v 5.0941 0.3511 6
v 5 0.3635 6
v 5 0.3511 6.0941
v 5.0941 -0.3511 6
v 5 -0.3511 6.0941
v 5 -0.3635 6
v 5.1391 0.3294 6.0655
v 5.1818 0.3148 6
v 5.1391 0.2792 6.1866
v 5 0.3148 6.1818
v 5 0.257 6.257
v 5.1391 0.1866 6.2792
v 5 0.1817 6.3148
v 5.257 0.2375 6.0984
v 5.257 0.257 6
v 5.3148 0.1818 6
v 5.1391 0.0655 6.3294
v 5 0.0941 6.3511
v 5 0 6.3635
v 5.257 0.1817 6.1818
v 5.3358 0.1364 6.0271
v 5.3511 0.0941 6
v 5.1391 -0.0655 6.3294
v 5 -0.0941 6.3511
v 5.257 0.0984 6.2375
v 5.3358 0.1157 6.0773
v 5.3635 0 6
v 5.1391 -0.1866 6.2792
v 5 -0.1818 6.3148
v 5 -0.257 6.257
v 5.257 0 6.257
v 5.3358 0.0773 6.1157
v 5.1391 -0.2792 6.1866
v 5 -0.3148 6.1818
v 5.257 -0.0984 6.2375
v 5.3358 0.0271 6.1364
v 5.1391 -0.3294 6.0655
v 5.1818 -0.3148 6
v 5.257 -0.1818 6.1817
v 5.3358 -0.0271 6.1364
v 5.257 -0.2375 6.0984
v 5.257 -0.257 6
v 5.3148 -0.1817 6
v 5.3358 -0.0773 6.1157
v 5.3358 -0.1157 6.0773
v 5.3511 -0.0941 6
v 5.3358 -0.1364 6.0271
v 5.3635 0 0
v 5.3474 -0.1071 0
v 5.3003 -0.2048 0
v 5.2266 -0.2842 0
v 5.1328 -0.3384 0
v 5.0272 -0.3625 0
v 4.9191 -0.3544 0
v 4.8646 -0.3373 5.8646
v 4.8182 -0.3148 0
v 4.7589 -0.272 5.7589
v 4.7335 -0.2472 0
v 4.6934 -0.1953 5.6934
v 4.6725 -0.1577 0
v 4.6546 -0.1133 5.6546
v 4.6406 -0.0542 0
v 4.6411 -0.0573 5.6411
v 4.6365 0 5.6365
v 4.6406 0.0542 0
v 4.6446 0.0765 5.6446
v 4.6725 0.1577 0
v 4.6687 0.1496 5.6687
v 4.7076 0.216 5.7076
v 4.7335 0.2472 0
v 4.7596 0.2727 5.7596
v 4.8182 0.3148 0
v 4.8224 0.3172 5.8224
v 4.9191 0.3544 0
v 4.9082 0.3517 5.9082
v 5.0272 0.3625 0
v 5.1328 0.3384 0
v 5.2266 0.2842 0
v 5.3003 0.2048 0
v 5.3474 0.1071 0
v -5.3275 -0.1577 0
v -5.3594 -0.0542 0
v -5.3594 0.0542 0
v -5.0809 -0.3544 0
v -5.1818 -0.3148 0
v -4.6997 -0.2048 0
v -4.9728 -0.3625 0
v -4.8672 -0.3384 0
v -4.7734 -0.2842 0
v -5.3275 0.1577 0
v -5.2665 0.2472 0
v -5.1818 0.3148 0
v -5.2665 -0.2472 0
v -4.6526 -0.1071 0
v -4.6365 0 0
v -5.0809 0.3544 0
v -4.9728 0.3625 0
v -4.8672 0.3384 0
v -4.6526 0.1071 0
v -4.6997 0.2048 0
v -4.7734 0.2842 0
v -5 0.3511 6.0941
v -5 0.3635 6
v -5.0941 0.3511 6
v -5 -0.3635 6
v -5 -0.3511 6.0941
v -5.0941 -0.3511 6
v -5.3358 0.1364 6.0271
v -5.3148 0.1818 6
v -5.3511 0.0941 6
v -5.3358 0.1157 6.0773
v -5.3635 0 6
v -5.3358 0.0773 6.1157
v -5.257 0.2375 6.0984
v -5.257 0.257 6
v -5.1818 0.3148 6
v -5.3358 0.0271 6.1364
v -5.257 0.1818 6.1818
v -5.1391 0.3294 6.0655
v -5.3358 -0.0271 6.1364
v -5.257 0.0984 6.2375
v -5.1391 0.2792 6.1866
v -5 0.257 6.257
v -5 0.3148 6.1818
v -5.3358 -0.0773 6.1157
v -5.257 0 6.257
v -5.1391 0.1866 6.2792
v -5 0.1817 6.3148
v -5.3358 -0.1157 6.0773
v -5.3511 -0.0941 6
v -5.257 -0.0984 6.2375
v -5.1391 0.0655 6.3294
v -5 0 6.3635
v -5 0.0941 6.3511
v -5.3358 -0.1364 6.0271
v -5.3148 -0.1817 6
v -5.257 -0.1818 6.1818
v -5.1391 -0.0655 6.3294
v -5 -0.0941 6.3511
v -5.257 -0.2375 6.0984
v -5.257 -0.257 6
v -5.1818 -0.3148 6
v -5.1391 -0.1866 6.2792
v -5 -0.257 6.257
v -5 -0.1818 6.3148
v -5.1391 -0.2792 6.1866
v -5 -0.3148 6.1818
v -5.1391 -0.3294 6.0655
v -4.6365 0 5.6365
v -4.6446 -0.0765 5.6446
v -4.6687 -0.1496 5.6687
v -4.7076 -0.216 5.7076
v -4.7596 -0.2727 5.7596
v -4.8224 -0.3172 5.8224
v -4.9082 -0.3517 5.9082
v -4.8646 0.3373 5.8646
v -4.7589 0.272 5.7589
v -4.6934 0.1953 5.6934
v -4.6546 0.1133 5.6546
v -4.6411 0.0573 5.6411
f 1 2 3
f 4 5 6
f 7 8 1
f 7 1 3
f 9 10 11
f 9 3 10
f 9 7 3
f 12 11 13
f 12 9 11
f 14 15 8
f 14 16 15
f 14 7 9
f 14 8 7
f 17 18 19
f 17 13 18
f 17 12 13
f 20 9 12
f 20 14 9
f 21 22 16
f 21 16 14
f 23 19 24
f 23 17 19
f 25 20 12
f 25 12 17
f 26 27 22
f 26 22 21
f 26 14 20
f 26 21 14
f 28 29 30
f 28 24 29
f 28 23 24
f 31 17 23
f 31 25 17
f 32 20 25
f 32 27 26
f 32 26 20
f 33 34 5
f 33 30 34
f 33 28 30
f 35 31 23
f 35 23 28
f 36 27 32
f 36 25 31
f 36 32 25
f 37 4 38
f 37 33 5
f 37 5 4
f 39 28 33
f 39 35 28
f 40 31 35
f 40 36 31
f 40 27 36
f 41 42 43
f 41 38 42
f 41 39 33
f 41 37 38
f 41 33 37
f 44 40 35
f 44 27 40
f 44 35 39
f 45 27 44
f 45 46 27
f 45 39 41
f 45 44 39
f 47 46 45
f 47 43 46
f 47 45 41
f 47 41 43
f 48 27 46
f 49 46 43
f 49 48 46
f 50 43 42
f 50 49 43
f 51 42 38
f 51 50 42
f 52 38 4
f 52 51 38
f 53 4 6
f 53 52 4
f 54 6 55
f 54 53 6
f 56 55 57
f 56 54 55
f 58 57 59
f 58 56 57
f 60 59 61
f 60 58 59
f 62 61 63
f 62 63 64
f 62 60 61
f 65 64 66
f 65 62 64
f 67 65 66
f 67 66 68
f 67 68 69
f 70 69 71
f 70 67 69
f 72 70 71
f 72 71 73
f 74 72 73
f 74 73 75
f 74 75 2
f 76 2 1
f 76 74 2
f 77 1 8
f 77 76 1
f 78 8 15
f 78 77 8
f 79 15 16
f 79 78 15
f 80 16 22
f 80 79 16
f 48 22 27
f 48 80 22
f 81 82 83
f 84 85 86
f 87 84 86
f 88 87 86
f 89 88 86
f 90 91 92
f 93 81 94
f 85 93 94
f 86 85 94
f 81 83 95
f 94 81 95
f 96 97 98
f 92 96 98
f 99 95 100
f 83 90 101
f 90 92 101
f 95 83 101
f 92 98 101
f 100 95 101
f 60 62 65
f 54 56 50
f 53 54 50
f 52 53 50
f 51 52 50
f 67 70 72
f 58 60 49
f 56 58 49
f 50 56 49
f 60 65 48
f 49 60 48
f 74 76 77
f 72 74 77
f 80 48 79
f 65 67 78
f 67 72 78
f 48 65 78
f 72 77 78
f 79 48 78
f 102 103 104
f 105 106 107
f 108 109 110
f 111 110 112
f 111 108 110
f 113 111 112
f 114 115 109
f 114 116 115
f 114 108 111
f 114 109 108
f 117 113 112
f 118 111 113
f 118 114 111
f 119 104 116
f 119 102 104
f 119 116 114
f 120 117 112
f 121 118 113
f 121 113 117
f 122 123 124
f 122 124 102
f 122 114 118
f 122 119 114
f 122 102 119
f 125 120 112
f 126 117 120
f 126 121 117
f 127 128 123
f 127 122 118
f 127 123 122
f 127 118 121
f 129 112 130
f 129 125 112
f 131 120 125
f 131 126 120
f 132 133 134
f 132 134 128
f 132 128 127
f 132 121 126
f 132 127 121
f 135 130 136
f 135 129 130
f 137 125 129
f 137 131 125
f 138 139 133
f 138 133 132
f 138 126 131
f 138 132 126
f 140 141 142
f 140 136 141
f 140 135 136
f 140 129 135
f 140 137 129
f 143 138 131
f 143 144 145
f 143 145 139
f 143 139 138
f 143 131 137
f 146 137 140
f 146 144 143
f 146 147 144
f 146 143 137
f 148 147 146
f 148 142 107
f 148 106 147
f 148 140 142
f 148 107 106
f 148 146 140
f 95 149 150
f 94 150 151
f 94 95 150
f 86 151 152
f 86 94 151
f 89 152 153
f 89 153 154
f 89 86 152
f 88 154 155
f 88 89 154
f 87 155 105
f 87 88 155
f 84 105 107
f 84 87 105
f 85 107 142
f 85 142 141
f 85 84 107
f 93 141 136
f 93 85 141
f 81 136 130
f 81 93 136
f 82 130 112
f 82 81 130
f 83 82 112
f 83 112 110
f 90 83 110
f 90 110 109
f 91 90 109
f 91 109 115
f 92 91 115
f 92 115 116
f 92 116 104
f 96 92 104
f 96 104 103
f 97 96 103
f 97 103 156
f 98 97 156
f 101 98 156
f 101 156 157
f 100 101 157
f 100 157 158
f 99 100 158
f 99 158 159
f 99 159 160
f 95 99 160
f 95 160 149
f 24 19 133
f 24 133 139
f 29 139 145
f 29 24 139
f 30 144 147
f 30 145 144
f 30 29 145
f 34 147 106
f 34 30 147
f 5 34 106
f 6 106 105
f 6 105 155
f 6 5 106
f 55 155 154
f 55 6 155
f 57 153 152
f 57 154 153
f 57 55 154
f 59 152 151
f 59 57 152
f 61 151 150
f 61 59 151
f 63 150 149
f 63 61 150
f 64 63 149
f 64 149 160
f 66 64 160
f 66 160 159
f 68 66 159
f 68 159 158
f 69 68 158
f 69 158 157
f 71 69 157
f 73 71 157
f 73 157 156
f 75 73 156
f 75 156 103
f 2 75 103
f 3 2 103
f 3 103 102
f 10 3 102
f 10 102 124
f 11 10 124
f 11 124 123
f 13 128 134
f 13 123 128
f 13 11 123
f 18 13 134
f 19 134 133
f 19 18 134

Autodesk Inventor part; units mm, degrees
sketch "Sketch1" plane through (0, 0, 0) normal (0, 0, 1) x (1, 0, 0)
  circle A0 centre (-5, 0) radius 0.3635
  circle A1 centre (5, 0) radius 0.3635
  line L0 (-7.5089, 0) -> (7.5089, 0) projected
  point P0 (0, 0)
  point P1 (-5.3635, 0)
  point P2 (-4.6365, 0)
  dimension "d2" = 0.727
  dimension "d3" = 0.727
  dimension "d4" = 10
  dimension "d5" = 5
extrude "Extrusion1" add sketch "Sketch1" along normal blind 6
sketch "Sketch2" plane through (0, 0, 0) normal (0, 1, 0) x (-1, 0, 0)
  line L0 (-4.6365, 6) -> (-5.3635, 6) projected
  circle A0 centre (-5, 6) radius 0.3635
  line L1 (5.3635, 6) -> (4.6365, 6) projected
  circle A1 centre (5, 6) radius 0.3635
  line L2 (5, 6.3635) -> (-5, 6.3635)
  line L3 (-5, 6) -> (5, 6)
  point P0 (0, 0)
revolve "Revolution1" add sketch "Sketch2" angle 360 about axis through (5, 0, 6) along (-1, 0, 0) picked at (-5.1703, 6.1703) picked at (4.8297, 6.1703) contours L0 A0 | A0 L2 A1 L3 | A1 L1
equation "\"d5\" = 0.5 * d4"
properties part number "Wire" material "S235"
